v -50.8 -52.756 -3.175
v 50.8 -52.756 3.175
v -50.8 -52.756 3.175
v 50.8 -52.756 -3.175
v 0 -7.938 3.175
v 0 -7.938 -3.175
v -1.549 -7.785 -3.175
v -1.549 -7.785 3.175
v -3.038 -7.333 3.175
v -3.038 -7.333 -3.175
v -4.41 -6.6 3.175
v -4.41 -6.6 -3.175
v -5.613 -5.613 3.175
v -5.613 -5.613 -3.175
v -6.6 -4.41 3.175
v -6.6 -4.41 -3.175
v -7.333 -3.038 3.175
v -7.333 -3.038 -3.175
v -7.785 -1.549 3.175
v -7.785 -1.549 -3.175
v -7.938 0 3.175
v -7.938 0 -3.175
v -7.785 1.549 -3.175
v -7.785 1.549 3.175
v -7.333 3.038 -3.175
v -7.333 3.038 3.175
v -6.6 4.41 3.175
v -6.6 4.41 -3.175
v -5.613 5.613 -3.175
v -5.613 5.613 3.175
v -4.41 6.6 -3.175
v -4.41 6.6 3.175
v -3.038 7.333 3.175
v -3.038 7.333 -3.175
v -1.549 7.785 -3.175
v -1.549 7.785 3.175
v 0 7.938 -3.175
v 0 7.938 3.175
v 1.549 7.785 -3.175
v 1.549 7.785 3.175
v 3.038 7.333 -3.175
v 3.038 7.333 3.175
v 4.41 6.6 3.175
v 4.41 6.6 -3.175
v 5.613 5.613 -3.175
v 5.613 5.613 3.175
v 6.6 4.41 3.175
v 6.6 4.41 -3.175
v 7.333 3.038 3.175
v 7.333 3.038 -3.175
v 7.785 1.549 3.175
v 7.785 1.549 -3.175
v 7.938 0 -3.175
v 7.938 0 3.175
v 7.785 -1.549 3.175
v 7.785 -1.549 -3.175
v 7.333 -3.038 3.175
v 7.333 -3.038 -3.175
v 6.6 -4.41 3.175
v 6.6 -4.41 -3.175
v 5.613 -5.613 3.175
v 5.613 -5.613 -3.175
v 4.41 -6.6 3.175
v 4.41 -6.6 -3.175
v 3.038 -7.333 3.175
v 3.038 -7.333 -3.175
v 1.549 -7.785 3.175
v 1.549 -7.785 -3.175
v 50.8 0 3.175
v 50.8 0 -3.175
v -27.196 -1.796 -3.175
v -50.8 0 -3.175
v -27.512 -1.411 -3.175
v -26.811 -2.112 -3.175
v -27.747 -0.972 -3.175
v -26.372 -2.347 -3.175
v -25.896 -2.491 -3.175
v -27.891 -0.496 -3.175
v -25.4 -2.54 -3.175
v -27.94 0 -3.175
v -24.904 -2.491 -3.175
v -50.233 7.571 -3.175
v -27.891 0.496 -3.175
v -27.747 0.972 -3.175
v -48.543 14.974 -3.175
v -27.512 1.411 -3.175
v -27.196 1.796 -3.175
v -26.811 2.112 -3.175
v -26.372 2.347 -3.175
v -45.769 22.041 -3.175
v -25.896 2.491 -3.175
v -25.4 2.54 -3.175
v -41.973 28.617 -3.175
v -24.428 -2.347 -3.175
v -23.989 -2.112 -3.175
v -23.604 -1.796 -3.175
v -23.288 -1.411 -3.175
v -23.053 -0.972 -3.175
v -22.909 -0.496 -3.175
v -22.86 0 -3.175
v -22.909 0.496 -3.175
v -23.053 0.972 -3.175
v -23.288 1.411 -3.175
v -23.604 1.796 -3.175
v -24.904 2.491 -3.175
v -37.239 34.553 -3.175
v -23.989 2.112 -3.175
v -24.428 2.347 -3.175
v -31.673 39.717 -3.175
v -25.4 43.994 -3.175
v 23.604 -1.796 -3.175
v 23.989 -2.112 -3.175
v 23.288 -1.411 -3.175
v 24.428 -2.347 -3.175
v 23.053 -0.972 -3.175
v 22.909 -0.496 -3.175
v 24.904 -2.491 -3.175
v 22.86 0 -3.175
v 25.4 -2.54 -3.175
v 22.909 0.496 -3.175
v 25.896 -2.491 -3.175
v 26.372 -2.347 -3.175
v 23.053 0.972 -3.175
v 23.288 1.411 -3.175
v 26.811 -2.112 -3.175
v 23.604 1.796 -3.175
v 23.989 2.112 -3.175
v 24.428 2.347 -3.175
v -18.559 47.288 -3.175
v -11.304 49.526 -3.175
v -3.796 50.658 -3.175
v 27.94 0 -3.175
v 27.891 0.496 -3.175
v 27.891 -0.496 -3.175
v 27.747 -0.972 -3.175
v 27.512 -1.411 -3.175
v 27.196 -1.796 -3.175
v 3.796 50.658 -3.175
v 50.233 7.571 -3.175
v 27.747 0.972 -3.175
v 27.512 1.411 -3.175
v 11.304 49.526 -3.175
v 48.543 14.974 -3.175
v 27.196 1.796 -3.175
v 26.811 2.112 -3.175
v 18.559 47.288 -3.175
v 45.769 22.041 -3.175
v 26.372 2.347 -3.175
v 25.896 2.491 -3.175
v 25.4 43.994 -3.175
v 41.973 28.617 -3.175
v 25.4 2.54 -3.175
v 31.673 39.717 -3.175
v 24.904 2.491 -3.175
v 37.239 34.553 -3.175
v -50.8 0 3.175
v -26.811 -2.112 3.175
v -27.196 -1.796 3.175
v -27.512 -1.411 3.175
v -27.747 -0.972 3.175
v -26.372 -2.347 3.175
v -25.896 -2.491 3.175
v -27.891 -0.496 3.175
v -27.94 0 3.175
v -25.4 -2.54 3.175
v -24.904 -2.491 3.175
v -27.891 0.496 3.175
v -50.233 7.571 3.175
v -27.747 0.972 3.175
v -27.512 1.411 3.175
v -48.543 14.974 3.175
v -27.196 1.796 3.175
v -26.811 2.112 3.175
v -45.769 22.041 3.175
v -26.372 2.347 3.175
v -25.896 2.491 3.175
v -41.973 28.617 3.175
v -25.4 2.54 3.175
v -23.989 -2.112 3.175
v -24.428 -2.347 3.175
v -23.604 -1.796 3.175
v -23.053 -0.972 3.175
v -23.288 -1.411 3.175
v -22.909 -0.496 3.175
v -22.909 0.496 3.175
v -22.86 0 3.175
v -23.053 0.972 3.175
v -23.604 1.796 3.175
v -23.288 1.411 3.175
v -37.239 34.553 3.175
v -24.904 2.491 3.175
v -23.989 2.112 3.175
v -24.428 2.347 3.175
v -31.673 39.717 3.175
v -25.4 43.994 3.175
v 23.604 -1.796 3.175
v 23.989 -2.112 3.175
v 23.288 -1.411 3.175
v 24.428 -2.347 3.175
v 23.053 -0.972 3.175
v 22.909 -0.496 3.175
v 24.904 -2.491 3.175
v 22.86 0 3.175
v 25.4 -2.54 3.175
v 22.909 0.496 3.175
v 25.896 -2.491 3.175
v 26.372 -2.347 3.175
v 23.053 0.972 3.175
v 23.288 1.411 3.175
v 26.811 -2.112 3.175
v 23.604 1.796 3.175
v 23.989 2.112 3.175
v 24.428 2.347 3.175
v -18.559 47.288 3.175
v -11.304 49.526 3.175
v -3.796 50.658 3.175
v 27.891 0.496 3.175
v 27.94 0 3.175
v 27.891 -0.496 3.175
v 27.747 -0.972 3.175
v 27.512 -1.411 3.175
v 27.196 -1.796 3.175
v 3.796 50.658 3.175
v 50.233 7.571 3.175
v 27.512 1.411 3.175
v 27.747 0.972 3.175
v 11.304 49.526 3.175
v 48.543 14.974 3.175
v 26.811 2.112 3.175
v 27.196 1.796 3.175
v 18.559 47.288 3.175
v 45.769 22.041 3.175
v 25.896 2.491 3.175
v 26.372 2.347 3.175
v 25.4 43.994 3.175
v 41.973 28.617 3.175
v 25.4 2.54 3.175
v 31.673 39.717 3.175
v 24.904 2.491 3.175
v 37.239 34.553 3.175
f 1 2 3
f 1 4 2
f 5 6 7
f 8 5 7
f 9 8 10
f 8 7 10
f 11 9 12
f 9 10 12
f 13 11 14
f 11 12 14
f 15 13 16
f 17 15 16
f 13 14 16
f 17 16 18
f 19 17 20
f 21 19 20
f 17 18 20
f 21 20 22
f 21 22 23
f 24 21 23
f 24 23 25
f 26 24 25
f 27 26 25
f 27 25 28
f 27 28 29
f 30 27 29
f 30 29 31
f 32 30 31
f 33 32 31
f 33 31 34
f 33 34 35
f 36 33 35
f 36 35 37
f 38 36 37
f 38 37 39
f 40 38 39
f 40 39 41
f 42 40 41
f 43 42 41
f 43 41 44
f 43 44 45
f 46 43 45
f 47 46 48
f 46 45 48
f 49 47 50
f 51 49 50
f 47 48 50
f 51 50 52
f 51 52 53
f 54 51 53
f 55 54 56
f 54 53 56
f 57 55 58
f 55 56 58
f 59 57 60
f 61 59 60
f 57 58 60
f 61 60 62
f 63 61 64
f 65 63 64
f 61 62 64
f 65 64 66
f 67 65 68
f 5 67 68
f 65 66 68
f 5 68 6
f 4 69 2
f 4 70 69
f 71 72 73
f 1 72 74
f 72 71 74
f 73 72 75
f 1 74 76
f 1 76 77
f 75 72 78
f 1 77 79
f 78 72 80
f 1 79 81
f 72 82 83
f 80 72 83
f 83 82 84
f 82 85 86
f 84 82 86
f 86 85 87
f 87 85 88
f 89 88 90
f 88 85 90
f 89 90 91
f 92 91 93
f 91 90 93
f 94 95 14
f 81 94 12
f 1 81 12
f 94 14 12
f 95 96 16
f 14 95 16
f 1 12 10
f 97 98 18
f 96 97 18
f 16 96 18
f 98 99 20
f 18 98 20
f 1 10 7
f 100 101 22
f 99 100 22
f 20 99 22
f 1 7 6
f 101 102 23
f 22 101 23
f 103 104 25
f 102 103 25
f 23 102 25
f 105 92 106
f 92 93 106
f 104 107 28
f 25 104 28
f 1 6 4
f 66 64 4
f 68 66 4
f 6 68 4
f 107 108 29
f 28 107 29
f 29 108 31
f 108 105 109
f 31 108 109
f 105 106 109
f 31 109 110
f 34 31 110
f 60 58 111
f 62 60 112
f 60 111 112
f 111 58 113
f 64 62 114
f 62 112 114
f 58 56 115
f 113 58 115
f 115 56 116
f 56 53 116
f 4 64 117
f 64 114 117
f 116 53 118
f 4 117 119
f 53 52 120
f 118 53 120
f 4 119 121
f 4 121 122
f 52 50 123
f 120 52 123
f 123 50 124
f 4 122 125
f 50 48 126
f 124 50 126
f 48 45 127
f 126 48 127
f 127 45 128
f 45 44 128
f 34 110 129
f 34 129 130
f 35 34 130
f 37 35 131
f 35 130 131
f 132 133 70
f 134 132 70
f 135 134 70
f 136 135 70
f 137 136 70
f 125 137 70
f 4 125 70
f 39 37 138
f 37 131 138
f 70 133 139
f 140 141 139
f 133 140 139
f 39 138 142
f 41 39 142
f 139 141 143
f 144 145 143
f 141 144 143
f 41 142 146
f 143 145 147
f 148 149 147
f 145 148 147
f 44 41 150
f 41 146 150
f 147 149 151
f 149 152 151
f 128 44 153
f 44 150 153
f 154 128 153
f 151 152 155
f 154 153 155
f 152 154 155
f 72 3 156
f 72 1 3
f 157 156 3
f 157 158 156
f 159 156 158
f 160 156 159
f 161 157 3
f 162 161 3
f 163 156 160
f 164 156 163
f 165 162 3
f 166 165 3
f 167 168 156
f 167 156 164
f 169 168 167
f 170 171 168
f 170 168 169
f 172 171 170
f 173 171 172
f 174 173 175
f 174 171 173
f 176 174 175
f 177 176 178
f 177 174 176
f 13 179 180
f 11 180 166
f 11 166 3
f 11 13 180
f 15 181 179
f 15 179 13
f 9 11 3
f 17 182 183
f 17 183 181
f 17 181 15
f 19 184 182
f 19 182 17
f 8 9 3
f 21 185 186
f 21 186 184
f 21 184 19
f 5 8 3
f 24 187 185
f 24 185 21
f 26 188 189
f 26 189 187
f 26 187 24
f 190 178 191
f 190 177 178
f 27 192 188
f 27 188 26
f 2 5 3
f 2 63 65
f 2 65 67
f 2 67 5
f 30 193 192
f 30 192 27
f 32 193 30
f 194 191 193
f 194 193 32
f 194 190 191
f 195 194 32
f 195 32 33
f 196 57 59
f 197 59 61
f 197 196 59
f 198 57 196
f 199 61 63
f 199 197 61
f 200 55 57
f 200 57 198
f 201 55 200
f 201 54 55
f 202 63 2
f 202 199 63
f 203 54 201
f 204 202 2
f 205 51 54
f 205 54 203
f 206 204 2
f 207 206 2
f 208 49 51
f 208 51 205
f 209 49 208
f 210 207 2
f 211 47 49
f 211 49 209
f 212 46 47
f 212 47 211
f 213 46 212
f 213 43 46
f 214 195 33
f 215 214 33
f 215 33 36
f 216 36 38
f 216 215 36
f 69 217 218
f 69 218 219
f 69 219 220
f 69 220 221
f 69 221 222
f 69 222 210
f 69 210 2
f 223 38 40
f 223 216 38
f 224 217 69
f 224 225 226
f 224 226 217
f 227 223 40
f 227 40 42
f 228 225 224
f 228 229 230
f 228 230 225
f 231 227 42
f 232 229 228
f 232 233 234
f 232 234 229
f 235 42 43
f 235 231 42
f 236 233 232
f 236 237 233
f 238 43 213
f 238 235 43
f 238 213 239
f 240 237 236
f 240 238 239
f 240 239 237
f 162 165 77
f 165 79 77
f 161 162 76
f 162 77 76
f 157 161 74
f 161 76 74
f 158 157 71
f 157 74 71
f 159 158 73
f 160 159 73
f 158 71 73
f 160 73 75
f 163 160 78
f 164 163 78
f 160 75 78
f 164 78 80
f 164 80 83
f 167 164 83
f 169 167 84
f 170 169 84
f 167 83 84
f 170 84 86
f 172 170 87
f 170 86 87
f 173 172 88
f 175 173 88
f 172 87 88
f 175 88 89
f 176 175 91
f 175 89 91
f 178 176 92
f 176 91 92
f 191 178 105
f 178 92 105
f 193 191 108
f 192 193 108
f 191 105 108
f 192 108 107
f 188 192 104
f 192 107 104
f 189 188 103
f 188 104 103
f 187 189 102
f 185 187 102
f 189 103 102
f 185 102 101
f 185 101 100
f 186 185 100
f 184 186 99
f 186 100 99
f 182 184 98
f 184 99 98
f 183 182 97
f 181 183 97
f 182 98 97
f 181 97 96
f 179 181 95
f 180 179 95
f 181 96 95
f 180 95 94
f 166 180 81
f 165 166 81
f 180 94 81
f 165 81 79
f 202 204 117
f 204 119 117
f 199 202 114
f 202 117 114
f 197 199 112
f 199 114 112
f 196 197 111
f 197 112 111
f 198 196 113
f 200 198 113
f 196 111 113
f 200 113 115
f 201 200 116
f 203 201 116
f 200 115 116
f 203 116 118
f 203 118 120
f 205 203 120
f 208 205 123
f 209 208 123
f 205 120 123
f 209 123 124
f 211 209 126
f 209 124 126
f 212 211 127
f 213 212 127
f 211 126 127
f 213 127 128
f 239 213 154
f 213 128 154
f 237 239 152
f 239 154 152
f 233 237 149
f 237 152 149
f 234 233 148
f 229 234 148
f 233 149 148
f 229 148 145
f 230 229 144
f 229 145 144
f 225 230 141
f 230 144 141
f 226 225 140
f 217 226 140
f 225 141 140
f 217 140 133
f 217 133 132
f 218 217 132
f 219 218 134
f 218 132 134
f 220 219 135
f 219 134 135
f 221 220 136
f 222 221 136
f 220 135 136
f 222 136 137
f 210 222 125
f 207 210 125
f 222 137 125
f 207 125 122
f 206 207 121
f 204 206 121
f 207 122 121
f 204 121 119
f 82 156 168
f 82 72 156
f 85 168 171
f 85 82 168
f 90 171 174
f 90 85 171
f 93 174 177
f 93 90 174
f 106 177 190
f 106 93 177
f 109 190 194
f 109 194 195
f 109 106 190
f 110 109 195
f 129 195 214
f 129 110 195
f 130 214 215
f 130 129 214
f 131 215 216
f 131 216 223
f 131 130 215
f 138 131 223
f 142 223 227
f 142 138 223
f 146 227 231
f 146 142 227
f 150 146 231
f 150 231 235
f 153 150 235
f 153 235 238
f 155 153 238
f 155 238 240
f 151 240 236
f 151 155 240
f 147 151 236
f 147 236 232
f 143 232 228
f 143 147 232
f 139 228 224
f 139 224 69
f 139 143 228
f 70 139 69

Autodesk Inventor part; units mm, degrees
sketch "Sketch1" plane through (0, 0, 0) normal (0, 0, 1) x (1, 0, 0)
  arc A0 (50.8, 0) -> (-50.8, 0) centre (0, 0) ccw
  line L0 (50.8, 0) -> (50.8, -52.7558)
  line L1 (50.8, -52.7558) -> (-50.8, -52.7558)
  line L2 (-50.8, -52.7558) -> (-50.8, 0)
  line L3 (0, 71.5112) -> (0, -73.467) projected
  dimension "d2" = 52.7558
  dimension "d3" = 50.8
  dimension "d22" = 0
extrude "Extrusion1" add sketch "Sketch1" along normal mid plane 6.35
sketch "Sketch2" plane through (0, 0, 3.175) normal (0, 0, 1) x (1, 0, 0)
  point P0 (0, 0)
  point P1 (0, 0)
hole "Hole1" at (0, 0, 3.175) direction (0, 0, -1) diameter 15.875 end through all
sketch "Sketch5" plane through (0, 0, 3.175) normal (0, 0, 1) x (1, 0, 0)
  circle A0 centre (-25.4, 0) radius 2.54
  line L0 (0, 50.8056) -> (0, 0) construction
  circle A1 centre (25.4, 0) radius 2.54
  dimension "d31" = 5.08
  dimension "d32" = 25.4
hole "Hole4" at (-25.4, 0, 3.175) at (25.4, 0, 3.175) direction (0, 0, -1) diameter 5.08 end through all
properties part number "Boom Hinge" material "Aluminum 6061"
